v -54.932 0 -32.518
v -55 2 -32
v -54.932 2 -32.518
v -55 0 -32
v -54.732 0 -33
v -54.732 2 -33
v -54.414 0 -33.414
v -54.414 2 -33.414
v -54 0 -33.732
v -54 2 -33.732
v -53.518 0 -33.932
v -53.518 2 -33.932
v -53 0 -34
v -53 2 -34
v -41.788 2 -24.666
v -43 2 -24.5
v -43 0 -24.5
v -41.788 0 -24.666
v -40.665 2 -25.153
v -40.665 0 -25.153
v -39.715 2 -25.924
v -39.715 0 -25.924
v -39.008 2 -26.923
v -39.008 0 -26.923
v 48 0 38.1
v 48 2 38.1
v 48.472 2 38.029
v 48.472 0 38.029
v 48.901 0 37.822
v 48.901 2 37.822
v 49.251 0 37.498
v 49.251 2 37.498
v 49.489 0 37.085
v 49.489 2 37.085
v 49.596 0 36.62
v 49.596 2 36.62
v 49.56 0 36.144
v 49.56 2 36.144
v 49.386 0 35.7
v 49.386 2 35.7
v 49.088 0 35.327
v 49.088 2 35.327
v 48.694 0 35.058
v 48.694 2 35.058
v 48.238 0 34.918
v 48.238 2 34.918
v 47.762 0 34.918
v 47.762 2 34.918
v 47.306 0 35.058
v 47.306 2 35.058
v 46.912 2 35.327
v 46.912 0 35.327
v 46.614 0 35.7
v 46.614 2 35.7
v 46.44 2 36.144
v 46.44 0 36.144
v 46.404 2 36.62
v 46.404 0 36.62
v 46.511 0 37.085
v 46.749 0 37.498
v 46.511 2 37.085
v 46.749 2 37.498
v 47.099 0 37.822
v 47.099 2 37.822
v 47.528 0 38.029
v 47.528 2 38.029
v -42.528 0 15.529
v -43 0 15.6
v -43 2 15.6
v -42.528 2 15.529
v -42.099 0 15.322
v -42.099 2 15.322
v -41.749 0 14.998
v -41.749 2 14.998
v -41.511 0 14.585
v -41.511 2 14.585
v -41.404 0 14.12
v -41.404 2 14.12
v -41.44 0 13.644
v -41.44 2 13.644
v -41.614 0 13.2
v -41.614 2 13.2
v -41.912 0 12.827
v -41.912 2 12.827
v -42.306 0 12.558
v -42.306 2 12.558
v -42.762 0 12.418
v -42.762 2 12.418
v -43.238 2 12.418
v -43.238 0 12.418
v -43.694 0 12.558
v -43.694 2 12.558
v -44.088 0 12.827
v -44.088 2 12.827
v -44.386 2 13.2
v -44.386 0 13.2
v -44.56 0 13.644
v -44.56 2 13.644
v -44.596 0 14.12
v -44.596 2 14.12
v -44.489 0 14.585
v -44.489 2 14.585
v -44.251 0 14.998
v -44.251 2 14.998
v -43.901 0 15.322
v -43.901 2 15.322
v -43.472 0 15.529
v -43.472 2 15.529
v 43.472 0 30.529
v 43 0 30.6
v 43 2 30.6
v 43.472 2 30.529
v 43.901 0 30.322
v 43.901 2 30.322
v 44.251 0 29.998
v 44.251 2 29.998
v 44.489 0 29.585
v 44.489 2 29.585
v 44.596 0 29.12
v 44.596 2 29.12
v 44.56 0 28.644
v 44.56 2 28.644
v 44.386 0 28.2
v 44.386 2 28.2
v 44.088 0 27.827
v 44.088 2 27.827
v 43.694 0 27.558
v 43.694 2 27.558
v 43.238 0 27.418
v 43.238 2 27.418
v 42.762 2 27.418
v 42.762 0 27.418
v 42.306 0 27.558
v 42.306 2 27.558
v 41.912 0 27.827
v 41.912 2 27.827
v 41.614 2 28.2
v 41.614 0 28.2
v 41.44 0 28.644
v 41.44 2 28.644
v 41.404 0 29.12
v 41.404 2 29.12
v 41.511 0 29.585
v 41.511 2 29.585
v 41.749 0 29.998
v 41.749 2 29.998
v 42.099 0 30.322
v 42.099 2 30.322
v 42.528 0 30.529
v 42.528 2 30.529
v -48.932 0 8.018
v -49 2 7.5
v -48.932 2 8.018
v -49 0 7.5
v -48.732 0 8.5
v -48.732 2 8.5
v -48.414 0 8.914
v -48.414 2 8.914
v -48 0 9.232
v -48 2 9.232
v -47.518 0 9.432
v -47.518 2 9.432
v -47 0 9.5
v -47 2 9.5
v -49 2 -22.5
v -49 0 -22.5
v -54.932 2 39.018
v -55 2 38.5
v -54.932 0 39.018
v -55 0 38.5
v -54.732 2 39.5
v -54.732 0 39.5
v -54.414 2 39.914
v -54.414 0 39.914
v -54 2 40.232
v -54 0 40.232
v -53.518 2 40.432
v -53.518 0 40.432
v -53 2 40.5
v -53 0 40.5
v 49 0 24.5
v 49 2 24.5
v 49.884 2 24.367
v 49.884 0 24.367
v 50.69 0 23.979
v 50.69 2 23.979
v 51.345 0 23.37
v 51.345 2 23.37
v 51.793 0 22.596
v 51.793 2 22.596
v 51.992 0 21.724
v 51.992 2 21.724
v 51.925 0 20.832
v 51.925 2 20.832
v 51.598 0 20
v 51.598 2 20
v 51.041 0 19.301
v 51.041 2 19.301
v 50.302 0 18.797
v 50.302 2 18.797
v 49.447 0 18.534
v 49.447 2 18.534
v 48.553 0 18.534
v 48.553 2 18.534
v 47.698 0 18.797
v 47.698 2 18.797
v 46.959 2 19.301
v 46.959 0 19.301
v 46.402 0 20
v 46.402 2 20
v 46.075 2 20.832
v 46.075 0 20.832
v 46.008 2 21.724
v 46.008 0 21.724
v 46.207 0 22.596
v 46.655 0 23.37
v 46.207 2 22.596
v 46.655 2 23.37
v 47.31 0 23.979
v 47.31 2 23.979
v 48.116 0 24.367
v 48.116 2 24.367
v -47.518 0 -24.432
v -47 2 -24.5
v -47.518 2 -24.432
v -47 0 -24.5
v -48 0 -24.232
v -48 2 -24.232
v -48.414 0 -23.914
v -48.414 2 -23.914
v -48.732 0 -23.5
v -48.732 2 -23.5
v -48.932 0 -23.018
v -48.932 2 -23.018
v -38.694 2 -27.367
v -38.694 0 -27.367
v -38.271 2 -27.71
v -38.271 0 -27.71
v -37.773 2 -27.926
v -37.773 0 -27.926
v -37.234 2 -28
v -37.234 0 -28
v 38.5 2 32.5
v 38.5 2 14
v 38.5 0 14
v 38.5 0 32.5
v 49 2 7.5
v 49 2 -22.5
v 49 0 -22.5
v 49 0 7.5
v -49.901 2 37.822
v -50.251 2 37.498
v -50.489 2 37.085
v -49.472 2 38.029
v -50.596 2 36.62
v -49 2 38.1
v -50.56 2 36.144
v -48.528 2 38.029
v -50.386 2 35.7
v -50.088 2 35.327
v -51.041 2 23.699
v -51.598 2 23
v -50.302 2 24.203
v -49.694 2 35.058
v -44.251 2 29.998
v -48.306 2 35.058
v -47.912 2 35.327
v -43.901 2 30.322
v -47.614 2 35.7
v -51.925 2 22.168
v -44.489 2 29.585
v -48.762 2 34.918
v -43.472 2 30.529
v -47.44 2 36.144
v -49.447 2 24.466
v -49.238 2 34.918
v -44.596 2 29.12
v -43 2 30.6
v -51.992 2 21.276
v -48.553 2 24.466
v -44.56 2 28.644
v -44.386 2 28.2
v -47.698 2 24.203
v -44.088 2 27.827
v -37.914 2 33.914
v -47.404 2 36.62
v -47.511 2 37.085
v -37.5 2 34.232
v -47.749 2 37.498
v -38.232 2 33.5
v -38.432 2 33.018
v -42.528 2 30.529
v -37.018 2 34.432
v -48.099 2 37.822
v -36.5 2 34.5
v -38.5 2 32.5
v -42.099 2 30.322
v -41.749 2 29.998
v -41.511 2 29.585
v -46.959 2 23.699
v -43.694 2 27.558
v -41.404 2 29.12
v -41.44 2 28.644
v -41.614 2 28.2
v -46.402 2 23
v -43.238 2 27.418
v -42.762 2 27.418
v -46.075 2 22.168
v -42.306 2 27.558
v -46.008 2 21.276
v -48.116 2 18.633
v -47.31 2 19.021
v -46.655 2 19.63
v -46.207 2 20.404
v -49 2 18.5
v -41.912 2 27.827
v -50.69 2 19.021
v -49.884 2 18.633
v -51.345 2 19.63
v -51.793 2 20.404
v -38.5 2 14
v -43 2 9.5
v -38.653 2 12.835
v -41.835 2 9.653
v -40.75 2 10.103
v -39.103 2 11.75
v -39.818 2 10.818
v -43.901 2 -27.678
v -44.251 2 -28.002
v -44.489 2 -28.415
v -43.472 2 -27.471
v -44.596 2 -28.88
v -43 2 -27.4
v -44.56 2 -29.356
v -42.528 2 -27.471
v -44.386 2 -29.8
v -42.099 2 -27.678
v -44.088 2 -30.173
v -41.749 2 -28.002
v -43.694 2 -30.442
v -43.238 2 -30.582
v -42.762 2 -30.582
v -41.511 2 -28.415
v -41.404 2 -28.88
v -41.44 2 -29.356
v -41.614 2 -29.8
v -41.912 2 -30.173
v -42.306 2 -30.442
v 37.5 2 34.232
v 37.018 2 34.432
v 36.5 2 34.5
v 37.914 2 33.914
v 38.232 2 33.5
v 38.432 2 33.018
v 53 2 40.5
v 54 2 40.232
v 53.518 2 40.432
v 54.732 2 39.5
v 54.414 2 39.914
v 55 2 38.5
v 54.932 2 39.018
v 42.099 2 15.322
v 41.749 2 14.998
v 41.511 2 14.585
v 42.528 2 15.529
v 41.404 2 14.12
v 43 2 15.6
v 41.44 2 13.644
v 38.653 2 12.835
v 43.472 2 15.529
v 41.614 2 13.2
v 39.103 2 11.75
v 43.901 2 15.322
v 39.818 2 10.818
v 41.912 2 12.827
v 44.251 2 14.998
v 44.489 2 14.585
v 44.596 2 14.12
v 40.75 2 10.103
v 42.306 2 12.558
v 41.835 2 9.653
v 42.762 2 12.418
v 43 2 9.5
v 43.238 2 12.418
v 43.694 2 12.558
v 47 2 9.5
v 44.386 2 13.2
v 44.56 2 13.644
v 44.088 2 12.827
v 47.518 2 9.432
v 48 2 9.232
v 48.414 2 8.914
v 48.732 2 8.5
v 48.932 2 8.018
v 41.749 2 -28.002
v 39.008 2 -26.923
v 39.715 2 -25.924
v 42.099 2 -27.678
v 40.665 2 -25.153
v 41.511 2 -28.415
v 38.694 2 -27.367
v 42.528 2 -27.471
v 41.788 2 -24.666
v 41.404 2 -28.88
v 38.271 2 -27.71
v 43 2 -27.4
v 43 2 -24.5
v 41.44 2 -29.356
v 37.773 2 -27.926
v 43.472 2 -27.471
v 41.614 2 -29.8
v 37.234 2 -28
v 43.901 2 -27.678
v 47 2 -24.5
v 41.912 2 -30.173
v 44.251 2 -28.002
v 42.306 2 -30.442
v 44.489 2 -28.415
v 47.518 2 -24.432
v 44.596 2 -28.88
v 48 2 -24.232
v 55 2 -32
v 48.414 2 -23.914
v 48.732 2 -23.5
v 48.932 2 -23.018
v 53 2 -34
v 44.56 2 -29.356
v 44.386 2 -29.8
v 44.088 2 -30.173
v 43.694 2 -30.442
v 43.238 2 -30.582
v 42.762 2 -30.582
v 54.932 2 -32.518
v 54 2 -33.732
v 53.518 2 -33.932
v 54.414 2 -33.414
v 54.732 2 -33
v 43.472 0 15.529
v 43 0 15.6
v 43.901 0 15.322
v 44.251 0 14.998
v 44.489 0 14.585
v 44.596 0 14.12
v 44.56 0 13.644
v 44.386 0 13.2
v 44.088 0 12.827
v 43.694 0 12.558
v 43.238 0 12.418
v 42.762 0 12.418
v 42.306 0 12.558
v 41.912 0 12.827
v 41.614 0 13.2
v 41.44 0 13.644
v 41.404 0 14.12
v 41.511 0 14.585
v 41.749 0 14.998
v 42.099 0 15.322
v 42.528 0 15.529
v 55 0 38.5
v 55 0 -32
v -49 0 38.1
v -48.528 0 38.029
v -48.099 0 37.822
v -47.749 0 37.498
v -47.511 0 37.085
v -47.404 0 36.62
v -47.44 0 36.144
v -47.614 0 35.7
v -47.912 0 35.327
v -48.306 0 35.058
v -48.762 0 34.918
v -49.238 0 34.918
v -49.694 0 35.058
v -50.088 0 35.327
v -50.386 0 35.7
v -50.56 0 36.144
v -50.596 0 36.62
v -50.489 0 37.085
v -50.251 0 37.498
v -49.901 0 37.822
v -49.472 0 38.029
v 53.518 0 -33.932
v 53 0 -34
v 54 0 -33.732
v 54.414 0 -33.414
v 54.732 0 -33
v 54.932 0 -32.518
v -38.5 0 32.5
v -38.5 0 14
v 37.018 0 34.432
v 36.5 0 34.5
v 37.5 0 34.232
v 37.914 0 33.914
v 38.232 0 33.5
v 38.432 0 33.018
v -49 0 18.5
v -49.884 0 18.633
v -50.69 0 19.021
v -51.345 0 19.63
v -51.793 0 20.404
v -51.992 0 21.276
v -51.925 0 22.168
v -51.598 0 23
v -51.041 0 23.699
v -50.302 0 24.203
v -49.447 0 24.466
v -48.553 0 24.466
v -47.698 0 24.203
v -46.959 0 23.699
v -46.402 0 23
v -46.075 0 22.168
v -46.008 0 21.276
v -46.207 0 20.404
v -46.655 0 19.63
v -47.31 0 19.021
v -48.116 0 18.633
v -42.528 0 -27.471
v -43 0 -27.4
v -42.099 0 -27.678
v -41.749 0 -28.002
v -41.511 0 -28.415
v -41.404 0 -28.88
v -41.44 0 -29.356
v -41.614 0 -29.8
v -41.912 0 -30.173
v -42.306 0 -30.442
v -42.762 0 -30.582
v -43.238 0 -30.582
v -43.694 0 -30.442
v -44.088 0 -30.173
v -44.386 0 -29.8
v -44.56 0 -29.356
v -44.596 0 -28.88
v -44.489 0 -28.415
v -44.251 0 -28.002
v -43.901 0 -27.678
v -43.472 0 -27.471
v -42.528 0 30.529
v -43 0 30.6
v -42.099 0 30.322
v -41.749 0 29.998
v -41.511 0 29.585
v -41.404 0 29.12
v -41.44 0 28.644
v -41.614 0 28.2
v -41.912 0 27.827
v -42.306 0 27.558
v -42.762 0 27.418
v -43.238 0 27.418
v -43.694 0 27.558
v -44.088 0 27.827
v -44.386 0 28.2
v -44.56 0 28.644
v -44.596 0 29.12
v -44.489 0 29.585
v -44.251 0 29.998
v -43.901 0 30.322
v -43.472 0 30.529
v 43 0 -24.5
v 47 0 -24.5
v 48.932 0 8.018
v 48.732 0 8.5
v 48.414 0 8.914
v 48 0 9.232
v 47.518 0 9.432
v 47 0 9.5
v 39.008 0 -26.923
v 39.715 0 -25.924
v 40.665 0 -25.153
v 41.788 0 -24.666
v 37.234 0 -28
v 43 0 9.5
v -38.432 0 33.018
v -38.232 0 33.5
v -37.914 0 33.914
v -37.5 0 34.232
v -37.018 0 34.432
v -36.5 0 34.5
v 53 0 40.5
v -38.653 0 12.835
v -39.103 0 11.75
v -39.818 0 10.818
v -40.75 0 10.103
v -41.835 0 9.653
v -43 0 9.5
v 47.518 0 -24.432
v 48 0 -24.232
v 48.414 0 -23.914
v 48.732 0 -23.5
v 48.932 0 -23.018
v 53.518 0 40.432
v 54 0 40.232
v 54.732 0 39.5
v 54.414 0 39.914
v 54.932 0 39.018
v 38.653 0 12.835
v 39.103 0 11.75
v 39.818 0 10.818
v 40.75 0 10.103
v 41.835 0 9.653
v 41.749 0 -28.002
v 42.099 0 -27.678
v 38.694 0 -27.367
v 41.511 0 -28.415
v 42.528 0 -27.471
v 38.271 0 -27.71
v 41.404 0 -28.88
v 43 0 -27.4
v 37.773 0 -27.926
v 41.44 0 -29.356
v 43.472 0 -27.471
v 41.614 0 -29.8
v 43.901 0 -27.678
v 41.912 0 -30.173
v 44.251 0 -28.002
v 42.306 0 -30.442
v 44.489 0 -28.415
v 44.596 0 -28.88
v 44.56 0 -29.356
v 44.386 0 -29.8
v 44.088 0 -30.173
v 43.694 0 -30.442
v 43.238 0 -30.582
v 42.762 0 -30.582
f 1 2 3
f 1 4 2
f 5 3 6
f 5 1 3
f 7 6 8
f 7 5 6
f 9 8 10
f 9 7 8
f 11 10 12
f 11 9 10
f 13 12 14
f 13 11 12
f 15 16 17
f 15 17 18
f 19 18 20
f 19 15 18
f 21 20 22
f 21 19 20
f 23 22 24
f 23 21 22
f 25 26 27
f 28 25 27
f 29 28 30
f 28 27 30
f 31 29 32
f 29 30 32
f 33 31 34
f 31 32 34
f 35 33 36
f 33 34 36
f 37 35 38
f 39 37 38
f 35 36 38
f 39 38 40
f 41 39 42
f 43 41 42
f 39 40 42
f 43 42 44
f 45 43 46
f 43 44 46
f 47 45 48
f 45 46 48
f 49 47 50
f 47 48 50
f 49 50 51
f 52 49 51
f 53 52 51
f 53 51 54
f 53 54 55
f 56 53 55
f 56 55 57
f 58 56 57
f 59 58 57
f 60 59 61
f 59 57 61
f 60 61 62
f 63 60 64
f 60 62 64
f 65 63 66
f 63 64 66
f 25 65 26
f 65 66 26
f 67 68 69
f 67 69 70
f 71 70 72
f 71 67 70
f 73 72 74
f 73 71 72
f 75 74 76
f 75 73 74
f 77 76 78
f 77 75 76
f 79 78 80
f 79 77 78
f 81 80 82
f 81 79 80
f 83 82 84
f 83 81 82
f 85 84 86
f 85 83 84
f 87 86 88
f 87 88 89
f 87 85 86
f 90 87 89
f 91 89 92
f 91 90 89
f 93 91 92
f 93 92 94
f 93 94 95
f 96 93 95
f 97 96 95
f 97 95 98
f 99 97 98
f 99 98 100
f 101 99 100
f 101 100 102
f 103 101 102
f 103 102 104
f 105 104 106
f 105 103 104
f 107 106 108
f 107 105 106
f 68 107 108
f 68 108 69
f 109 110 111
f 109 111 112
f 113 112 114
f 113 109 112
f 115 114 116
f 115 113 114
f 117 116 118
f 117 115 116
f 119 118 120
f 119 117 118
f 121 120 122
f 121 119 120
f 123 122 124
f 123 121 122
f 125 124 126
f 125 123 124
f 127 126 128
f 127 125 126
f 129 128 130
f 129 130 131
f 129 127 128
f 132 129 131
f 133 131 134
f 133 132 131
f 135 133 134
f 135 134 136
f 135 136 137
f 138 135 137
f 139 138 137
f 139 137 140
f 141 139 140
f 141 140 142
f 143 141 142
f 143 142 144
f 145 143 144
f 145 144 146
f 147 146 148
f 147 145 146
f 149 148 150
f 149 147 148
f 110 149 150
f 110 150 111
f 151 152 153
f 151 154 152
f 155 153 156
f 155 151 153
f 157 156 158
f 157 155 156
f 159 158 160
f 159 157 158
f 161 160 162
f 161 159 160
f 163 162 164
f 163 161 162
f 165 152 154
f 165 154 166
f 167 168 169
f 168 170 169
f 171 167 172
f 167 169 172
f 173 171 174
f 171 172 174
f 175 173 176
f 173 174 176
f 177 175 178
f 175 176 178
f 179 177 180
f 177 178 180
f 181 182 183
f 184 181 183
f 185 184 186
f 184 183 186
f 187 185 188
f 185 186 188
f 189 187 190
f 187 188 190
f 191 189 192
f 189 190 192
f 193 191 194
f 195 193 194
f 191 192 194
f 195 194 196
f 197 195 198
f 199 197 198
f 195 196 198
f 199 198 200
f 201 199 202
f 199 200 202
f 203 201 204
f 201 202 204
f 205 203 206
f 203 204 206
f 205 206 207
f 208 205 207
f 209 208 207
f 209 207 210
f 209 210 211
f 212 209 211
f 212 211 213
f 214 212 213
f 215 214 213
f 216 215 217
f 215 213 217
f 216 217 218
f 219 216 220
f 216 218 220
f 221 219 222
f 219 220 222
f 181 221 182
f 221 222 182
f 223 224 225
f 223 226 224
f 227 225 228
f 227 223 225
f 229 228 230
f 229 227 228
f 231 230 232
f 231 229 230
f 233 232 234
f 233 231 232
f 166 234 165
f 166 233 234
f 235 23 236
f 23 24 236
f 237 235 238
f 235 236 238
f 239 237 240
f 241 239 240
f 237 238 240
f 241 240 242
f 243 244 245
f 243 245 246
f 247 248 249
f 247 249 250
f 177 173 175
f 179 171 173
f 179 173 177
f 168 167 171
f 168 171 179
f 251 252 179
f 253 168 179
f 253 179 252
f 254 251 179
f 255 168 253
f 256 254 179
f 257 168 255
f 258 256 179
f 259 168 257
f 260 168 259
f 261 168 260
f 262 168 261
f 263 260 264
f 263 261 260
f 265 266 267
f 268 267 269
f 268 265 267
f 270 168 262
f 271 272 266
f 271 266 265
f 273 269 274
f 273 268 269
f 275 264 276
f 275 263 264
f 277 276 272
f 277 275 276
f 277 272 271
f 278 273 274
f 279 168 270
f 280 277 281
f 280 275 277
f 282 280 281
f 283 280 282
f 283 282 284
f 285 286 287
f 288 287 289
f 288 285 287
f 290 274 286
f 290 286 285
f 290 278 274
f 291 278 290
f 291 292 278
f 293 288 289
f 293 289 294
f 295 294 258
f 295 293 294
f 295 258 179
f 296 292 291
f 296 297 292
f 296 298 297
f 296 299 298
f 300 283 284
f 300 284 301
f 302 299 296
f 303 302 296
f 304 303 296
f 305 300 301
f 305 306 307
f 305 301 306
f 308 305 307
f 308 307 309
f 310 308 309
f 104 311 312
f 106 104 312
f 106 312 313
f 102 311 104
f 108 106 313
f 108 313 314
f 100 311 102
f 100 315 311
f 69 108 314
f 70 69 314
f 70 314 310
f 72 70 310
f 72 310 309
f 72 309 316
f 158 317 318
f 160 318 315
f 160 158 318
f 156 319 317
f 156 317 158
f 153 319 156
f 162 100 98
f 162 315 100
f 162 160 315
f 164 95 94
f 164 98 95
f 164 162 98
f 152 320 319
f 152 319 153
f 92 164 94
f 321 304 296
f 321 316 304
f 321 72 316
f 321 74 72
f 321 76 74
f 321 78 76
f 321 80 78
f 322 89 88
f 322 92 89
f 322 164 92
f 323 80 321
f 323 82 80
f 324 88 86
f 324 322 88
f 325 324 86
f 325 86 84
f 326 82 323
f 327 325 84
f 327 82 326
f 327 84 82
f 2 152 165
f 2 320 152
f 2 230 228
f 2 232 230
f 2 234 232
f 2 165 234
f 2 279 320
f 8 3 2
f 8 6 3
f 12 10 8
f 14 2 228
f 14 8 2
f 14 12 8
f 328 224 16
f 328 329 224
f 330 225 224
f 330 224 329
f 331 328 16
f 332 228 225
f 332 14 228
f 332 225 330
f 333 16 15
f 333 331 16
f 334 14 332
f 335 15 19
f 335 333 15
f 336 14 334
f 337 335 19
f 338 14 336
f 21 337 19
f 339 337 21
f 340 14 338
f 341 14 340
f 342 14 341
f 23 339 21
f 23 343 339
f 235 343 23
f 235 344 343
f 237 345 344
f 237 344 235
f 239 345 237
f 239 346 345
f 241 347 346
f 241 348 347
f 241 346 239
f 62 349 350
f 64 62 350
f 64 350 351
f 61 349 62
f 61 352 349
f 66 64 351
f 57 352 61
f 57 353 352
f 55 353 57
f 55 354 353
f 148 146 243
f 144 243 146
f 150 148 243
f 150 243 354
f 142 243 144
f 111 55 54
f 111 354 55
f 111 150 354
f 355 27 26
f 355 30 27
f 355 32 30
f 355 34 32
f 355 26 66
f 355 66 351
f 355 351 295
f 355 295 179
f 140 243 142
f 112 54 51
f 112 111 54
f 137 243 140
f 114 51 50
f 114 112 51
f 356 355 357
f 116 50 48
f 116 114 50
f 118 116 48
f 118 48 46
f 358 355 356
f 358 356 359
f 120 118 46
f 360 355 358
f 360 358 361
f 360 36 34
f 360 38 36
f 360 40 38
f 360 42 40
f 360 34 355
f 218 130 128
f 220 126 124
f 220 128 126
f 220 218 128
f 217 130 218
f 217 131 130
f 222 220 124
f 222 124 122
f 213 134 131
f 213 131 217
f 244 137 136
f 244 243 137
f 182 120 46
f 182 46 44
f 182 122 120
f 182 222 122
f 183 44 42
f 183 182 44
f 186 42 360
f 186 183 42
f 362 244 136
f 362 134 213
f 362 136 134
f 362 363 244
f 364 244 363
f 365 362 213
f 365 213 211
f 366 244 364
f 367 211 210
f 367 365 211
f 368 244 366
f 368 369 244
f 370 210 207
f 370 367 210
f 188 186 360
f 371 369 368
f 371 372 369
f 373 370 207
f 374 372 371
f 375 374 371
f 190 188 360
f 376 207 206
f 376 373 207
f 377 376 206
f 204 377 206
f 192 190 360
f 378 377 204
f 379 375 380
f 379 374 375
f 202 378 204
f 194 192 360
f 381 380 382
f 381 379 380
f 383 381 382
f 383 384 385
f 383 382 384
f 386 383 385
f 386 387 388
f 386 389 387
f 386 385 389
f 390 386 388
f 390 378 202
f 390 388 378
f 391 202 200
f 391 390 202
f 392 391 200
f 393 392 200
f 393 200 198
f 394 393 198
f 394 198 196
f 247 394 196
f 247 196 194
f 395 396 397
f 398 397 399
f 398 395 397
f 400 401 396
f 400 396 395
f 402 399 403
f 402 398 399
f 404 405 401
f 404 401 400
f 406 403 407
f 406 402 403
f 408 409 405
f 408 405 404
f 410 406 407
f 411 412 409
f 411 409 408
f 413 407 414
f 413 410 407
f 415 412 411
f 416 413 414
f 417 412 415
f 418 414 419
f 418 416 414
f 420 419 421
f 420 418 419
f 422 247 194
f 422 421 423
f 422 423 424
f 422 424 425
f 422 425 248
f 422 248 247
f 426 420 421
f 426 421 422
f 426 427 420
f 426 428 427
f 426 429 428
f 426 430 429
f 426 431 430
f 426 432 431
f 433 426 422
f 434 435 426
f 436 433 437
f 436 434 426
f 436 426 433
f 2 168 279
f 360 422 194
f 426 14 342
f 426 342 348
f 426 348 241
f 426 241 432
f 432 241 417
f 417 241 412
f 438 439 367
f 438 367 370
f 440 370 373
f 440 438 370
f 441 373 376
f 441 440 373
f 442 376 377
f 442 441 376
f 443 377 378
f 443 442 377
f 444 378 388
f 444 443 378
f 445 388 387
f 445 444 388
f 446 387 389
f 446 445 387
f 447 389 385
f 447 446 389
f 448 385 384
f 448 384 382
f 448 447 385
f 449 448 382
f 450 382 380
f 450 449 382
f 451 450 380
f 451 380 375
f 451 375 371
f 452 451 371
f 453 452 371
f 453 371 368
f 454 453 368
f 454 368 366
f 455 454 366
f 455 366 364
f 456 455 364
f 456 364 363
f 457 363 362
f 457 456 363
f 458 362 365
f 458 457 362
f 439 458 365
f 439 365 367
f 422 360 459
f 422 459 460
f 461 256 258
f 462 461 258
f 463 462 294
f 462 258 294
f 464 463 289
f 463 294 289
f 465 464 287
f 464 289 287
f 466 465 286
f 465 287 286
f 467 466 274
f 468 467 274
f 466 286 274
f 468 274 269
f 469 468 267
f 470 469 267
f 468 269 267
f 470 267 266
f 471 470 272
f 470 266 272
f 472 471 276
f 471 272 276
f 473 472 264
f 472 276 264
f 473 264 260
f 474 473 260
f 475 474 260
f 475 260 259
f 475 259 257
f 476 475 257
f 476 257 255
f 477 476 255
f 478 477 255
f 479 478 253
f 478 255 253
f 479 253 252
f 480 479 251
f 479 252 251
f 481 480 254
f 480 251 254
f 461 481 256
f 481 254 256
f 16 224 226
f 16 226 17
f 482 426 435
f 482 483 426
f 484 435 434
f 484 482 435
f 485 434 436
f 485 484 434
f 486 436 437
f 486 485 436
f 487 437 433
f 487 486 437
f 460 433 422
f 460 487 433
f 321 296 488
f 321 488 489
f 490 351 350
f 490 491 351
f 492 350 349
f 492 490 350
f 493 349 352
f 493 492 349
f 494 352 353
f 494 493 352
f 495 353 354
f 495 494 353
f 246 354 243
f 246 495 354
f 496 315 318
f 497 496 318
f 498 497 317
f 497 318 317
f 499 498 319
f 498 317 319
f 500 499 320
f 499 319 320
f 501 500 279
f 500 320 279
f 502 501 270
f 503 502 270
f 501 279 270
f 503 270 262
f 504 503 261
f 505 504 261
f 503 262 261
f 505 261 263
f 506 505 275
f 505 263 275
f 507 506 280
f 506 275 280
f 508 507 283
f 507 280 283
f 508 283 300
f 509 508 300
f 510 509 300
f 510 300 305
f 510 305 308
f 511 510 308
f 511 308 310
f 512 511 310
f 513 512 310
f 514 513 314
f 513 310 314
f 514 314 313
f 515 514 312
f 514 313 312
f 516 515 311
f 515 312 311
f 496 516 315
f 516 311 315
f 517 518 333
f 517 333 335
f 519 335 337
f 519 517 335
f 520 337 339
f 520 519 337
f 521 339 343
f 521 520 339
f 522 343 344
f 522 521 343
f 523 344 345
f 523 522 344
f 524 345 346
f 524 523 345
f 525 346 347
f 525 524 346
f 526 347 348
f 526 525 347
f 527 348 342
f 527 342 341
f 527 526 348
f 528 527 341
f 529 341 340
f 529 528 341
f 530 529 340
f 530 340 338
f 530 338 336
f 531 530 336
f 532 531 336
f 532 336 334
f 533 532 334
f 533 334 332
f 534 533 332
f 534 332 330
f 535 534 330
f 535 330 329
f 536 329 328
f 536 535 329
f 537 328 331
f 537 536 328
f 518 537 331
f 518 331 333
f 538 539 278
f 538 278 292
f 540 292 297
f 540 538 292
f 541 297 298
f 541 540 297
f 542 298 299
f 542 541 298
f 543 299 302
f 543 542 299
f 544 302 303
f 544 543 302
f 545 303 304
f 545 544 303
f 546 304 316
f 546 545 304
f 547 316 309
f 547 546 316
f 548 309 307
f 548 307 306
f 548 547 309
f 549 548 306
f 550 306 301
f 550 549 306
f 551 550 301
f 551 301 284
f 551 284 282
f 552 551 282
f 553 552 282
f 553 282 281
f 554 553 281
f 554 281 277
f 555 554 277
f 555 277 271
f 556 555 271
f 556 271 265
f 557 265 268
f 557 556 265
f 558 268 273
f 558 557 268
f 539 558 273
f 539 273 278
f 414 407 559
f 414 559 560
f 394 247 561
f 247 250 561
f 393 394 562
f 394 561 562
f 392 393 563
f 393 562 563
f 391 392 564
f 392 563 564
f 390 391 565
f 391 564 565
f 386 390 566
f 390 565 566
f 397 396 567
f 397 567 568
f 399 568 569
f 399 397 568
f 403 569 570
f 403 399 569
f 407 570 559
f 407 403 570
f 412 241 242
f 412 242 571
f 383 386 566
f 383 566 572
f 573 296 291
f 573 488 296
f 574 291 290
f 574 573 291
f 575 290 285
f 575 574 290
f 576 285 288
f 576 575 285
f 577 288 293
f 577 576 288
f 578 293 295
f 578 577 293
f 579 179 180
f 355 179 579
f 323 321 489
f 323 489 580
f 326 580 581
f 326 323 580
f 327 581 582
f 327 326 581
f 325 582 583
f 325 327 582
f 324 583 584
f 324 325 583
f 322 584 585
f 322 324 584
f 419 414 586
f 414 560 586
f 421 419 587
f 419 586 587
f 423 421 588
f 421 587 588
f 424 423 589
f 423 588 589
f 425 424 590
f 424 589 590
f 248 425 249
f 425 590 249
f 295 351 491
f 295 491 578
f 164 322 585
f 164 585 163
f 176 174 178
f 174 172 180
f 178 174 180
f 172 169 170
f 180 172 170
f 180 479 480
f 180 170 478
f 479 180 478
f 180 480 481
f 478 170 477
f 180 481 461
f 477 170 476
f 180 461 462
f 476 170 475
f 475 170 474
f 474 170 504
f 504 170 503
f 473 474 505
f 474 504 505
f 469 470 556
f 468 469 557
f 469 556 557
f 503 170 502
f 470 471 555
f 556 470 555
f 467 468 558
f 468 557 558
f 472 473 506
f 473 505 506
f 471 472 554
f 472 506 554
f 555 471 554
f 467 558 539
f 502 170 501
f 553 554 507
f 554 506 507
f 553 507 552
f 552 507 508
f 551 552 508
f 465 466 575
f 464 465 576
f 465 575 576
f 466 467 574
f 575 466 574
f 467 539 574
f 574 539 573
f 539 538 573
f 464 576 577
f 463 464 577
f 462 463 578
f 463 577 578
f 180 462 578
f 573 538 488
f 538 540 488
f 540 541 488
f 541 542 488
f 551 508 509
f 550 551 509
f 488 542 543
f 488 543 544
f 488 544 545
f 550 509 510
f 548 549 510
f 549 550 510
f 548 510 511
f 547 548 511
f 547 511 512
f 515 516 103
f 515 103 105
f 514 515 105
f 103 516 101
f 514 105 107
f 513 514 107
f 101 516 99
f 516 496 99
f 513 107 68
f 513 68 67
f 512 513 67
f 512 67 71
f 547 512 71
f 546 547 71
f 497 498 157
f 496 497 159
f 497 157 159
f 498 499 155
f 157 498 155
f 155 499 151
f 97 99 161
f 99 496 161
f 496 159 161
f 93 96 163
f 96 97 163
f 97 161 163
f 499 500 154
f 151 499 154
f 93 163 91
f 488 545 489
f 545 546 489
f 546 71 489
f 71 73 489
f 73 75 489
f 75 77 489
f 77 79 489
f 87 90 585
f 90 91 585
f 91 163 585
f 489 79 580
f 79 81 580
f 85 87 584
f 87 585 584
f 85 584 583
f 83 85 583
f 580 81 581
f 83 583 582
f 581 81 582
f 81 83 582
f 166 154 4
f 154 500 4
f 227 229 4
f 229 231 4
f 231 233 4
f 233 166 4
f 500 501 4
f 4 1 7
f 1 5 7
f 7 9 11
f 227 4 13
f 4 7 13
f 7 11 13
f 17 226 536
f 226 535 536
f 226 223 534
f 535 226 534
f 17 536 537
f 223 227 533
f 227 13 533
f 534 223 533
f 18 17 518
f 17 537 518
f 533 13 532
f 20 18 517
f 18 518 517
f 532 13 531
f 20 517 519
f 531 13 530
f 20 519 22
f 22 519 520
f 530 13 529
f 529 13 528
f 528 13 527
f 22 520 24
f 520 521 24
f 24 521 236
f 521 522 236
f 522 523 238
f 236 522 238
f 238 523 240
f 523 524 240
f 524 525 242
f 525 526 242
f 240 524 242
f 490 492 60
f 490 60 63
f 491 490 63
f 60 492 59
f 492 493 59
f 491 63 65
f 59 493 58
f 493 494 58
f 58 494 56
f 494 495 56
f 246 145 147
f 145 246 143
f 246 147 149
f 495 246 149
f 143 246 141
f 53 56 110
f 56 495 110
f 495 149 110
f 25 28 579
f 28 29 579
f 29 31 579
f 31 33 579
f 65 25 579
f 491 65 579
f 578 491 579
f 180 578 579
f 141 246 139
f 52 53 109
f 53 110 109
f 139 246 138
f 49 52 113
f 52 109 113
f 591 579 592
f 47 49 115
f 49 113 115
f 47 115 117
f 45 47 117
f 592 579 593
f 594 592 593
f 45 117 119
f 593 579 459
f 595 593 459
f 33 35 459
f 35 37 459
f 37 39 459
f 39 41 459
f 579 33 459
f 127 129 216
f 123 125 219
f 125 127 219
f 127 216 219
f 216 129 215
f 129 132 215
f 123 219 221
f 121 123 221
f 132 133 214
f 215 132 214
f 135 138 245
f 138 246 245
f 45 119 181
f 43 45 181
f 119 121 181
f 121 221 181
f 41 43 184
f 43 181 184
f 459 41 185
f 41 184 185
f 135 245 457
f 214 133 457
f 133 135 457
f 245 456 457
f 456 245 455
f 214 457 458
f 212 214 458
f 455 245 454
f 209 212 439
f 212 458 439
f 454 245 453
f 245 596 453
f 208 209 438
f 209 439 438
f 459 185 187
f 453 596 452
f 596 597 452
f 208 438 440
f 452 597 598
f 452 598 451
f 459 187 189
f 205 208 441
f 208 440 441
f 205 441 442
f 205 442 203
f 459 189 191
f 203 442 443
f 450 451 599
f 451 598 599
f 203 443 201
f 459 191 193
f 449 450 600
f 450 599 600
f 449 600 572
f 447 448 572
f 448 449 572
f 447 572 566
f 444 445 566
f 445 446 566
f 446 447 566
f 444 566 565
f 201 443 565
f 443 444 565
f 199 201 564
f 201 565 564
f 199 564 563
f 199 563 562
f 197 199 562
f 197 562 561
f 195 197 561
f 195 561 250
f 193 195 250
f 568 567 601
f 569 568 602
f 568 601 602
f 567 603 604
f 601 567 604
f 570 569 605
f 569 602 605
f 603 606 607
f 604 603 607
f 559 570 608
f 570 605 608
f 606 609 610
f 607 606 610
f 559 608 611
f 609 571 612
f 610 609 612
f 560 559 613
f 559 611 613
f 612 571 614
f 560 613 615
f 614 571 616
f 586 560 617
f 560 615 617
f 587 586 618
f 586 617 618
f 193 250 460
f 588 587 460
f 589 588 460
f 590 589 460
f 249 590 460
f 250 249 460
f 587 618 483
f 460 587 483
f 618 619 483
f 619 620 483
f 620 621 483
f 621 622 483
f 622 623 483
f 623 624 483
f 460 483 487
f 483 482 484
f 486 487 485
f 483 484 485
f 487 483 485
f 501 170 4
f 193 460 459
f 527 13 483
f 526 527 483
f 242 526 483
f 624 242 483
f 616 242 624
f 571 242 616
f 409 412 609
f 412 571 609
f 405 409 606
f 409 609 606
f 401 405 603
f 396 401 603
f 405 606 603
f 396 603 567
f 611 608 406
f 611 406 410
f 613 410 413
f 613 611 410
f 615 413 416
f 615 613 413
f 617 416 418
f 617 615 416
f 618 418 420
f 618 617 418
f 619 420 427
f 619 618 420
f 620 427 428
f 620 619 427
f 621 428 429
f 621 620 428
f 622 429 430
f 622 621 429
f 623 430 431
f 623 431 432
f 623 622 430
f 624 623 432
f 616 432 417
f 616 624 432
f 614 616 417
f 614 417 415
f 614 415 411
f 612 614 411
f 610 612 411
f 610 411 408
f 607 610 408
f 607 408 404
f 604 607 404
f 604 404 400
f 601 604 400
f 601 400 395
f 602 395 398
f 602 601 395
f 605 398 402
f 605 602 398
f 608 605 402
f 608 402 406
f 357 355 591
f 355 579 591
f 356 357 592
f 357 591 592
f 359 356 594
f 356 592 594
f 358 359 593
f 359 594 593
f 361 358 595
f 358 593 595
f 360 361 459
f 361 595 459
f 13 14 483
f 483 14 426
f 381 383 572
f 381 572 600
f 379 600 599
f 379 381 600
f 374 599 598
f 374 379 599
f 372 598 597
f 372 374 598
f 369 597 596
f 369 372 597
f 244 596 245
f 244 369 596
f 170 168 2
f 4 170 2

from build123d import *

# Parameters (mm, degrees)
SKETCH_1_W          = 110
SKETCH_1_H          = 79
SKETCH_1_R          = 1.6
EXTRUDE_1_DEPTH     = 2
SKETCH_3_W          = 110
SKETCH_3_H          = 1
EXTRUDE_2_DEPTH     = 2
SKETCH_4_R          = 1.6
CUT_EXTRUDE_2_DEPTH = 2
SKETCH_6_W          = 110
SKETCH_6_H          = 5.5
CUT_EXTRUDE_4_DEPTH = 2
SKETCH_7_R          = 3
CUT_EXTRUDE_5_DEPTH = 2
FILLET_2_R          = 2


with BuildPart() as part:
    # 草图1 → 凸台-拉伸1 (new body)
    with BuildSketch(Plane(origin=(0, 0, 0), x_dir=(1, 0, 0), z_dir=(0, 1, 0))):
        Rectangle(SKETCH_1_W, SKETCH_1_H)
        with Locations(Location((43, -29, 0), (0, 0, 270))):
            Circle(SKETCH_1_R, mode=Mode.SUBTRACT)
        with Locations(Location((-43, -29, 0), (0, 0, 270))):
            Circle(SKETCH_1_R, mode=Mode.SUBTRACT)
        with Locations(Location((-43, 29, 0), (0, 0, 270))):
            Circle(SKETCH_1_R, mode=Mode.SUBTRACT)
        with Locations(Location((43, 29, 0), (0, 0, 270))):
            Circle(SKETCH_1_R, mode=Mode.SUBTRACT)
        with Locations(Location((43, -14, 0), (0, 0, 270))):
            Circle(SKETCH_1_R, mode=Mode.SUBTRACT)
        with Locations(Location((-43, -14, 0), (0, 0, 270))):
            Circle(SKETCH_1_R, mode=Mode.SUBTRACT)
    extrude(amount=EXTRUDE_1_DEPTH)

    # 草图3 → 凸台-拉伸2 (add)
    with BuildSketch(Plane(origin=(0, 2, 0), x_dir=(1, 0, 0), z_dir=(0, 1, 0))):
        with Locations((0, -40)):
            Rectangle(SKETCH_3_W, SKETCH_3_H)
    extrude(amount=-EXTRUDE_2_DEPTH)

    # 草图4 → 切除-拉伸2 (cut)
    with BuildSketch(Plane(origin=(0, 2, 0), x_dir=(1, 0, 0), z_dir=(0, 1, 0))):
        with Locations(Location((48, -36.5, 0), (0, 0, 270))):
            Circle(SKETCH_4_R)
        with Locations(Location((-49, -36.5, 0), (0, 0, 270))):
            Circle(SKETCH_4_R)
    extrude(amount=-CUT_EXTRUDE_2_DEPTH, mode=Mode.SUBTRACT)

    # 草图6 → 切除-拉伸4 (cut)
    with BuildSketch(Plane(origin=(0, 2, 0), x_dir=(1, 0, 0), z_dir=(0, 1, 0))):
        with Locations((0, 36.75)):
            Rectangle(SKETCH_6_W, SKETCH_6_H)
        with BuildLine():
            Line((-38.612517806, 28), (38.612517806, 28))
            ThreePointArc((38.612517806, 28), (40.19375696, 25.48218818), (43, 24.5))
            Line((43, 24.5), (49, 24.5))
            Line((49, 24.5), (49, -9.5))
            Line((49, -9.5), (43, -9.5))
            ThreePointArc((43, -9.5), (39.818019485, -10.818019485), (38.5, -14))
            Line((38.5, -14), (38.5, -34.5))
            Line((38.5, -34.5), (-38.5, -34.5))
            Line((-38.5, -34.5), (-38.5, -14))
            ThreePointArc((-38.5, -14), (-39.818019485, -10.818019485), (-43, -9.5))
            Line((-43, -9.5), (-49, -9.5))
            Line((-49, -9.5), (-49, 24.5))
            Line((-49, 24.5), (-43, 24.5))
            ThreePointArc((-43, 24.5), (-40.19375696, 25.48218818), (-38.612517806, 28))
        make_face()
    extrude(amount=-CUT_EXTRUDE_4_DEPTH, mode=Mode.SUBTRACT)

    # 草图7 → 切除-拉伸5 (cut)
    with BuildSketch(Plane(origin=(0, 2, 0), x_dir=(1, 0, 0), z_dir=(0, 1, 0))):
        with Locations(Location((49, -21.5, 0), (0, 0, 270))):
            Circle(SKETCH_7_R)
        with Locations(Location((-49, -21.5, 0), (0, 0, 90))):
            Circle(SKETCH_7_R)
    extrude(amount=-CUT_EXTRUDE_5_DEPTH, mode=Mode.SUBTRACT)

    # 圆角2
    fillet_2_edges = [part.edges().sort_by_distance(p)[0] for p in [
        (-55, 1, 40.5),
        (55, 1, 40.5),
        (38.5, 1, 34.5),
        (-38.5, 1, 34.5),
        (-49, 1, 9.5),
        (-49, 1, -24.5),
        (-38.612517806, 1, -28),
        (38.612517806, 1, -28),
        (49, 1, -24.5),
        (49, 1, 9.5),
        (-55, 1, -34),
        (55, 1, -34),
    ]]
    fillet(fillet_2_edges, radius=FILLET_2_R)


solid = part.part
